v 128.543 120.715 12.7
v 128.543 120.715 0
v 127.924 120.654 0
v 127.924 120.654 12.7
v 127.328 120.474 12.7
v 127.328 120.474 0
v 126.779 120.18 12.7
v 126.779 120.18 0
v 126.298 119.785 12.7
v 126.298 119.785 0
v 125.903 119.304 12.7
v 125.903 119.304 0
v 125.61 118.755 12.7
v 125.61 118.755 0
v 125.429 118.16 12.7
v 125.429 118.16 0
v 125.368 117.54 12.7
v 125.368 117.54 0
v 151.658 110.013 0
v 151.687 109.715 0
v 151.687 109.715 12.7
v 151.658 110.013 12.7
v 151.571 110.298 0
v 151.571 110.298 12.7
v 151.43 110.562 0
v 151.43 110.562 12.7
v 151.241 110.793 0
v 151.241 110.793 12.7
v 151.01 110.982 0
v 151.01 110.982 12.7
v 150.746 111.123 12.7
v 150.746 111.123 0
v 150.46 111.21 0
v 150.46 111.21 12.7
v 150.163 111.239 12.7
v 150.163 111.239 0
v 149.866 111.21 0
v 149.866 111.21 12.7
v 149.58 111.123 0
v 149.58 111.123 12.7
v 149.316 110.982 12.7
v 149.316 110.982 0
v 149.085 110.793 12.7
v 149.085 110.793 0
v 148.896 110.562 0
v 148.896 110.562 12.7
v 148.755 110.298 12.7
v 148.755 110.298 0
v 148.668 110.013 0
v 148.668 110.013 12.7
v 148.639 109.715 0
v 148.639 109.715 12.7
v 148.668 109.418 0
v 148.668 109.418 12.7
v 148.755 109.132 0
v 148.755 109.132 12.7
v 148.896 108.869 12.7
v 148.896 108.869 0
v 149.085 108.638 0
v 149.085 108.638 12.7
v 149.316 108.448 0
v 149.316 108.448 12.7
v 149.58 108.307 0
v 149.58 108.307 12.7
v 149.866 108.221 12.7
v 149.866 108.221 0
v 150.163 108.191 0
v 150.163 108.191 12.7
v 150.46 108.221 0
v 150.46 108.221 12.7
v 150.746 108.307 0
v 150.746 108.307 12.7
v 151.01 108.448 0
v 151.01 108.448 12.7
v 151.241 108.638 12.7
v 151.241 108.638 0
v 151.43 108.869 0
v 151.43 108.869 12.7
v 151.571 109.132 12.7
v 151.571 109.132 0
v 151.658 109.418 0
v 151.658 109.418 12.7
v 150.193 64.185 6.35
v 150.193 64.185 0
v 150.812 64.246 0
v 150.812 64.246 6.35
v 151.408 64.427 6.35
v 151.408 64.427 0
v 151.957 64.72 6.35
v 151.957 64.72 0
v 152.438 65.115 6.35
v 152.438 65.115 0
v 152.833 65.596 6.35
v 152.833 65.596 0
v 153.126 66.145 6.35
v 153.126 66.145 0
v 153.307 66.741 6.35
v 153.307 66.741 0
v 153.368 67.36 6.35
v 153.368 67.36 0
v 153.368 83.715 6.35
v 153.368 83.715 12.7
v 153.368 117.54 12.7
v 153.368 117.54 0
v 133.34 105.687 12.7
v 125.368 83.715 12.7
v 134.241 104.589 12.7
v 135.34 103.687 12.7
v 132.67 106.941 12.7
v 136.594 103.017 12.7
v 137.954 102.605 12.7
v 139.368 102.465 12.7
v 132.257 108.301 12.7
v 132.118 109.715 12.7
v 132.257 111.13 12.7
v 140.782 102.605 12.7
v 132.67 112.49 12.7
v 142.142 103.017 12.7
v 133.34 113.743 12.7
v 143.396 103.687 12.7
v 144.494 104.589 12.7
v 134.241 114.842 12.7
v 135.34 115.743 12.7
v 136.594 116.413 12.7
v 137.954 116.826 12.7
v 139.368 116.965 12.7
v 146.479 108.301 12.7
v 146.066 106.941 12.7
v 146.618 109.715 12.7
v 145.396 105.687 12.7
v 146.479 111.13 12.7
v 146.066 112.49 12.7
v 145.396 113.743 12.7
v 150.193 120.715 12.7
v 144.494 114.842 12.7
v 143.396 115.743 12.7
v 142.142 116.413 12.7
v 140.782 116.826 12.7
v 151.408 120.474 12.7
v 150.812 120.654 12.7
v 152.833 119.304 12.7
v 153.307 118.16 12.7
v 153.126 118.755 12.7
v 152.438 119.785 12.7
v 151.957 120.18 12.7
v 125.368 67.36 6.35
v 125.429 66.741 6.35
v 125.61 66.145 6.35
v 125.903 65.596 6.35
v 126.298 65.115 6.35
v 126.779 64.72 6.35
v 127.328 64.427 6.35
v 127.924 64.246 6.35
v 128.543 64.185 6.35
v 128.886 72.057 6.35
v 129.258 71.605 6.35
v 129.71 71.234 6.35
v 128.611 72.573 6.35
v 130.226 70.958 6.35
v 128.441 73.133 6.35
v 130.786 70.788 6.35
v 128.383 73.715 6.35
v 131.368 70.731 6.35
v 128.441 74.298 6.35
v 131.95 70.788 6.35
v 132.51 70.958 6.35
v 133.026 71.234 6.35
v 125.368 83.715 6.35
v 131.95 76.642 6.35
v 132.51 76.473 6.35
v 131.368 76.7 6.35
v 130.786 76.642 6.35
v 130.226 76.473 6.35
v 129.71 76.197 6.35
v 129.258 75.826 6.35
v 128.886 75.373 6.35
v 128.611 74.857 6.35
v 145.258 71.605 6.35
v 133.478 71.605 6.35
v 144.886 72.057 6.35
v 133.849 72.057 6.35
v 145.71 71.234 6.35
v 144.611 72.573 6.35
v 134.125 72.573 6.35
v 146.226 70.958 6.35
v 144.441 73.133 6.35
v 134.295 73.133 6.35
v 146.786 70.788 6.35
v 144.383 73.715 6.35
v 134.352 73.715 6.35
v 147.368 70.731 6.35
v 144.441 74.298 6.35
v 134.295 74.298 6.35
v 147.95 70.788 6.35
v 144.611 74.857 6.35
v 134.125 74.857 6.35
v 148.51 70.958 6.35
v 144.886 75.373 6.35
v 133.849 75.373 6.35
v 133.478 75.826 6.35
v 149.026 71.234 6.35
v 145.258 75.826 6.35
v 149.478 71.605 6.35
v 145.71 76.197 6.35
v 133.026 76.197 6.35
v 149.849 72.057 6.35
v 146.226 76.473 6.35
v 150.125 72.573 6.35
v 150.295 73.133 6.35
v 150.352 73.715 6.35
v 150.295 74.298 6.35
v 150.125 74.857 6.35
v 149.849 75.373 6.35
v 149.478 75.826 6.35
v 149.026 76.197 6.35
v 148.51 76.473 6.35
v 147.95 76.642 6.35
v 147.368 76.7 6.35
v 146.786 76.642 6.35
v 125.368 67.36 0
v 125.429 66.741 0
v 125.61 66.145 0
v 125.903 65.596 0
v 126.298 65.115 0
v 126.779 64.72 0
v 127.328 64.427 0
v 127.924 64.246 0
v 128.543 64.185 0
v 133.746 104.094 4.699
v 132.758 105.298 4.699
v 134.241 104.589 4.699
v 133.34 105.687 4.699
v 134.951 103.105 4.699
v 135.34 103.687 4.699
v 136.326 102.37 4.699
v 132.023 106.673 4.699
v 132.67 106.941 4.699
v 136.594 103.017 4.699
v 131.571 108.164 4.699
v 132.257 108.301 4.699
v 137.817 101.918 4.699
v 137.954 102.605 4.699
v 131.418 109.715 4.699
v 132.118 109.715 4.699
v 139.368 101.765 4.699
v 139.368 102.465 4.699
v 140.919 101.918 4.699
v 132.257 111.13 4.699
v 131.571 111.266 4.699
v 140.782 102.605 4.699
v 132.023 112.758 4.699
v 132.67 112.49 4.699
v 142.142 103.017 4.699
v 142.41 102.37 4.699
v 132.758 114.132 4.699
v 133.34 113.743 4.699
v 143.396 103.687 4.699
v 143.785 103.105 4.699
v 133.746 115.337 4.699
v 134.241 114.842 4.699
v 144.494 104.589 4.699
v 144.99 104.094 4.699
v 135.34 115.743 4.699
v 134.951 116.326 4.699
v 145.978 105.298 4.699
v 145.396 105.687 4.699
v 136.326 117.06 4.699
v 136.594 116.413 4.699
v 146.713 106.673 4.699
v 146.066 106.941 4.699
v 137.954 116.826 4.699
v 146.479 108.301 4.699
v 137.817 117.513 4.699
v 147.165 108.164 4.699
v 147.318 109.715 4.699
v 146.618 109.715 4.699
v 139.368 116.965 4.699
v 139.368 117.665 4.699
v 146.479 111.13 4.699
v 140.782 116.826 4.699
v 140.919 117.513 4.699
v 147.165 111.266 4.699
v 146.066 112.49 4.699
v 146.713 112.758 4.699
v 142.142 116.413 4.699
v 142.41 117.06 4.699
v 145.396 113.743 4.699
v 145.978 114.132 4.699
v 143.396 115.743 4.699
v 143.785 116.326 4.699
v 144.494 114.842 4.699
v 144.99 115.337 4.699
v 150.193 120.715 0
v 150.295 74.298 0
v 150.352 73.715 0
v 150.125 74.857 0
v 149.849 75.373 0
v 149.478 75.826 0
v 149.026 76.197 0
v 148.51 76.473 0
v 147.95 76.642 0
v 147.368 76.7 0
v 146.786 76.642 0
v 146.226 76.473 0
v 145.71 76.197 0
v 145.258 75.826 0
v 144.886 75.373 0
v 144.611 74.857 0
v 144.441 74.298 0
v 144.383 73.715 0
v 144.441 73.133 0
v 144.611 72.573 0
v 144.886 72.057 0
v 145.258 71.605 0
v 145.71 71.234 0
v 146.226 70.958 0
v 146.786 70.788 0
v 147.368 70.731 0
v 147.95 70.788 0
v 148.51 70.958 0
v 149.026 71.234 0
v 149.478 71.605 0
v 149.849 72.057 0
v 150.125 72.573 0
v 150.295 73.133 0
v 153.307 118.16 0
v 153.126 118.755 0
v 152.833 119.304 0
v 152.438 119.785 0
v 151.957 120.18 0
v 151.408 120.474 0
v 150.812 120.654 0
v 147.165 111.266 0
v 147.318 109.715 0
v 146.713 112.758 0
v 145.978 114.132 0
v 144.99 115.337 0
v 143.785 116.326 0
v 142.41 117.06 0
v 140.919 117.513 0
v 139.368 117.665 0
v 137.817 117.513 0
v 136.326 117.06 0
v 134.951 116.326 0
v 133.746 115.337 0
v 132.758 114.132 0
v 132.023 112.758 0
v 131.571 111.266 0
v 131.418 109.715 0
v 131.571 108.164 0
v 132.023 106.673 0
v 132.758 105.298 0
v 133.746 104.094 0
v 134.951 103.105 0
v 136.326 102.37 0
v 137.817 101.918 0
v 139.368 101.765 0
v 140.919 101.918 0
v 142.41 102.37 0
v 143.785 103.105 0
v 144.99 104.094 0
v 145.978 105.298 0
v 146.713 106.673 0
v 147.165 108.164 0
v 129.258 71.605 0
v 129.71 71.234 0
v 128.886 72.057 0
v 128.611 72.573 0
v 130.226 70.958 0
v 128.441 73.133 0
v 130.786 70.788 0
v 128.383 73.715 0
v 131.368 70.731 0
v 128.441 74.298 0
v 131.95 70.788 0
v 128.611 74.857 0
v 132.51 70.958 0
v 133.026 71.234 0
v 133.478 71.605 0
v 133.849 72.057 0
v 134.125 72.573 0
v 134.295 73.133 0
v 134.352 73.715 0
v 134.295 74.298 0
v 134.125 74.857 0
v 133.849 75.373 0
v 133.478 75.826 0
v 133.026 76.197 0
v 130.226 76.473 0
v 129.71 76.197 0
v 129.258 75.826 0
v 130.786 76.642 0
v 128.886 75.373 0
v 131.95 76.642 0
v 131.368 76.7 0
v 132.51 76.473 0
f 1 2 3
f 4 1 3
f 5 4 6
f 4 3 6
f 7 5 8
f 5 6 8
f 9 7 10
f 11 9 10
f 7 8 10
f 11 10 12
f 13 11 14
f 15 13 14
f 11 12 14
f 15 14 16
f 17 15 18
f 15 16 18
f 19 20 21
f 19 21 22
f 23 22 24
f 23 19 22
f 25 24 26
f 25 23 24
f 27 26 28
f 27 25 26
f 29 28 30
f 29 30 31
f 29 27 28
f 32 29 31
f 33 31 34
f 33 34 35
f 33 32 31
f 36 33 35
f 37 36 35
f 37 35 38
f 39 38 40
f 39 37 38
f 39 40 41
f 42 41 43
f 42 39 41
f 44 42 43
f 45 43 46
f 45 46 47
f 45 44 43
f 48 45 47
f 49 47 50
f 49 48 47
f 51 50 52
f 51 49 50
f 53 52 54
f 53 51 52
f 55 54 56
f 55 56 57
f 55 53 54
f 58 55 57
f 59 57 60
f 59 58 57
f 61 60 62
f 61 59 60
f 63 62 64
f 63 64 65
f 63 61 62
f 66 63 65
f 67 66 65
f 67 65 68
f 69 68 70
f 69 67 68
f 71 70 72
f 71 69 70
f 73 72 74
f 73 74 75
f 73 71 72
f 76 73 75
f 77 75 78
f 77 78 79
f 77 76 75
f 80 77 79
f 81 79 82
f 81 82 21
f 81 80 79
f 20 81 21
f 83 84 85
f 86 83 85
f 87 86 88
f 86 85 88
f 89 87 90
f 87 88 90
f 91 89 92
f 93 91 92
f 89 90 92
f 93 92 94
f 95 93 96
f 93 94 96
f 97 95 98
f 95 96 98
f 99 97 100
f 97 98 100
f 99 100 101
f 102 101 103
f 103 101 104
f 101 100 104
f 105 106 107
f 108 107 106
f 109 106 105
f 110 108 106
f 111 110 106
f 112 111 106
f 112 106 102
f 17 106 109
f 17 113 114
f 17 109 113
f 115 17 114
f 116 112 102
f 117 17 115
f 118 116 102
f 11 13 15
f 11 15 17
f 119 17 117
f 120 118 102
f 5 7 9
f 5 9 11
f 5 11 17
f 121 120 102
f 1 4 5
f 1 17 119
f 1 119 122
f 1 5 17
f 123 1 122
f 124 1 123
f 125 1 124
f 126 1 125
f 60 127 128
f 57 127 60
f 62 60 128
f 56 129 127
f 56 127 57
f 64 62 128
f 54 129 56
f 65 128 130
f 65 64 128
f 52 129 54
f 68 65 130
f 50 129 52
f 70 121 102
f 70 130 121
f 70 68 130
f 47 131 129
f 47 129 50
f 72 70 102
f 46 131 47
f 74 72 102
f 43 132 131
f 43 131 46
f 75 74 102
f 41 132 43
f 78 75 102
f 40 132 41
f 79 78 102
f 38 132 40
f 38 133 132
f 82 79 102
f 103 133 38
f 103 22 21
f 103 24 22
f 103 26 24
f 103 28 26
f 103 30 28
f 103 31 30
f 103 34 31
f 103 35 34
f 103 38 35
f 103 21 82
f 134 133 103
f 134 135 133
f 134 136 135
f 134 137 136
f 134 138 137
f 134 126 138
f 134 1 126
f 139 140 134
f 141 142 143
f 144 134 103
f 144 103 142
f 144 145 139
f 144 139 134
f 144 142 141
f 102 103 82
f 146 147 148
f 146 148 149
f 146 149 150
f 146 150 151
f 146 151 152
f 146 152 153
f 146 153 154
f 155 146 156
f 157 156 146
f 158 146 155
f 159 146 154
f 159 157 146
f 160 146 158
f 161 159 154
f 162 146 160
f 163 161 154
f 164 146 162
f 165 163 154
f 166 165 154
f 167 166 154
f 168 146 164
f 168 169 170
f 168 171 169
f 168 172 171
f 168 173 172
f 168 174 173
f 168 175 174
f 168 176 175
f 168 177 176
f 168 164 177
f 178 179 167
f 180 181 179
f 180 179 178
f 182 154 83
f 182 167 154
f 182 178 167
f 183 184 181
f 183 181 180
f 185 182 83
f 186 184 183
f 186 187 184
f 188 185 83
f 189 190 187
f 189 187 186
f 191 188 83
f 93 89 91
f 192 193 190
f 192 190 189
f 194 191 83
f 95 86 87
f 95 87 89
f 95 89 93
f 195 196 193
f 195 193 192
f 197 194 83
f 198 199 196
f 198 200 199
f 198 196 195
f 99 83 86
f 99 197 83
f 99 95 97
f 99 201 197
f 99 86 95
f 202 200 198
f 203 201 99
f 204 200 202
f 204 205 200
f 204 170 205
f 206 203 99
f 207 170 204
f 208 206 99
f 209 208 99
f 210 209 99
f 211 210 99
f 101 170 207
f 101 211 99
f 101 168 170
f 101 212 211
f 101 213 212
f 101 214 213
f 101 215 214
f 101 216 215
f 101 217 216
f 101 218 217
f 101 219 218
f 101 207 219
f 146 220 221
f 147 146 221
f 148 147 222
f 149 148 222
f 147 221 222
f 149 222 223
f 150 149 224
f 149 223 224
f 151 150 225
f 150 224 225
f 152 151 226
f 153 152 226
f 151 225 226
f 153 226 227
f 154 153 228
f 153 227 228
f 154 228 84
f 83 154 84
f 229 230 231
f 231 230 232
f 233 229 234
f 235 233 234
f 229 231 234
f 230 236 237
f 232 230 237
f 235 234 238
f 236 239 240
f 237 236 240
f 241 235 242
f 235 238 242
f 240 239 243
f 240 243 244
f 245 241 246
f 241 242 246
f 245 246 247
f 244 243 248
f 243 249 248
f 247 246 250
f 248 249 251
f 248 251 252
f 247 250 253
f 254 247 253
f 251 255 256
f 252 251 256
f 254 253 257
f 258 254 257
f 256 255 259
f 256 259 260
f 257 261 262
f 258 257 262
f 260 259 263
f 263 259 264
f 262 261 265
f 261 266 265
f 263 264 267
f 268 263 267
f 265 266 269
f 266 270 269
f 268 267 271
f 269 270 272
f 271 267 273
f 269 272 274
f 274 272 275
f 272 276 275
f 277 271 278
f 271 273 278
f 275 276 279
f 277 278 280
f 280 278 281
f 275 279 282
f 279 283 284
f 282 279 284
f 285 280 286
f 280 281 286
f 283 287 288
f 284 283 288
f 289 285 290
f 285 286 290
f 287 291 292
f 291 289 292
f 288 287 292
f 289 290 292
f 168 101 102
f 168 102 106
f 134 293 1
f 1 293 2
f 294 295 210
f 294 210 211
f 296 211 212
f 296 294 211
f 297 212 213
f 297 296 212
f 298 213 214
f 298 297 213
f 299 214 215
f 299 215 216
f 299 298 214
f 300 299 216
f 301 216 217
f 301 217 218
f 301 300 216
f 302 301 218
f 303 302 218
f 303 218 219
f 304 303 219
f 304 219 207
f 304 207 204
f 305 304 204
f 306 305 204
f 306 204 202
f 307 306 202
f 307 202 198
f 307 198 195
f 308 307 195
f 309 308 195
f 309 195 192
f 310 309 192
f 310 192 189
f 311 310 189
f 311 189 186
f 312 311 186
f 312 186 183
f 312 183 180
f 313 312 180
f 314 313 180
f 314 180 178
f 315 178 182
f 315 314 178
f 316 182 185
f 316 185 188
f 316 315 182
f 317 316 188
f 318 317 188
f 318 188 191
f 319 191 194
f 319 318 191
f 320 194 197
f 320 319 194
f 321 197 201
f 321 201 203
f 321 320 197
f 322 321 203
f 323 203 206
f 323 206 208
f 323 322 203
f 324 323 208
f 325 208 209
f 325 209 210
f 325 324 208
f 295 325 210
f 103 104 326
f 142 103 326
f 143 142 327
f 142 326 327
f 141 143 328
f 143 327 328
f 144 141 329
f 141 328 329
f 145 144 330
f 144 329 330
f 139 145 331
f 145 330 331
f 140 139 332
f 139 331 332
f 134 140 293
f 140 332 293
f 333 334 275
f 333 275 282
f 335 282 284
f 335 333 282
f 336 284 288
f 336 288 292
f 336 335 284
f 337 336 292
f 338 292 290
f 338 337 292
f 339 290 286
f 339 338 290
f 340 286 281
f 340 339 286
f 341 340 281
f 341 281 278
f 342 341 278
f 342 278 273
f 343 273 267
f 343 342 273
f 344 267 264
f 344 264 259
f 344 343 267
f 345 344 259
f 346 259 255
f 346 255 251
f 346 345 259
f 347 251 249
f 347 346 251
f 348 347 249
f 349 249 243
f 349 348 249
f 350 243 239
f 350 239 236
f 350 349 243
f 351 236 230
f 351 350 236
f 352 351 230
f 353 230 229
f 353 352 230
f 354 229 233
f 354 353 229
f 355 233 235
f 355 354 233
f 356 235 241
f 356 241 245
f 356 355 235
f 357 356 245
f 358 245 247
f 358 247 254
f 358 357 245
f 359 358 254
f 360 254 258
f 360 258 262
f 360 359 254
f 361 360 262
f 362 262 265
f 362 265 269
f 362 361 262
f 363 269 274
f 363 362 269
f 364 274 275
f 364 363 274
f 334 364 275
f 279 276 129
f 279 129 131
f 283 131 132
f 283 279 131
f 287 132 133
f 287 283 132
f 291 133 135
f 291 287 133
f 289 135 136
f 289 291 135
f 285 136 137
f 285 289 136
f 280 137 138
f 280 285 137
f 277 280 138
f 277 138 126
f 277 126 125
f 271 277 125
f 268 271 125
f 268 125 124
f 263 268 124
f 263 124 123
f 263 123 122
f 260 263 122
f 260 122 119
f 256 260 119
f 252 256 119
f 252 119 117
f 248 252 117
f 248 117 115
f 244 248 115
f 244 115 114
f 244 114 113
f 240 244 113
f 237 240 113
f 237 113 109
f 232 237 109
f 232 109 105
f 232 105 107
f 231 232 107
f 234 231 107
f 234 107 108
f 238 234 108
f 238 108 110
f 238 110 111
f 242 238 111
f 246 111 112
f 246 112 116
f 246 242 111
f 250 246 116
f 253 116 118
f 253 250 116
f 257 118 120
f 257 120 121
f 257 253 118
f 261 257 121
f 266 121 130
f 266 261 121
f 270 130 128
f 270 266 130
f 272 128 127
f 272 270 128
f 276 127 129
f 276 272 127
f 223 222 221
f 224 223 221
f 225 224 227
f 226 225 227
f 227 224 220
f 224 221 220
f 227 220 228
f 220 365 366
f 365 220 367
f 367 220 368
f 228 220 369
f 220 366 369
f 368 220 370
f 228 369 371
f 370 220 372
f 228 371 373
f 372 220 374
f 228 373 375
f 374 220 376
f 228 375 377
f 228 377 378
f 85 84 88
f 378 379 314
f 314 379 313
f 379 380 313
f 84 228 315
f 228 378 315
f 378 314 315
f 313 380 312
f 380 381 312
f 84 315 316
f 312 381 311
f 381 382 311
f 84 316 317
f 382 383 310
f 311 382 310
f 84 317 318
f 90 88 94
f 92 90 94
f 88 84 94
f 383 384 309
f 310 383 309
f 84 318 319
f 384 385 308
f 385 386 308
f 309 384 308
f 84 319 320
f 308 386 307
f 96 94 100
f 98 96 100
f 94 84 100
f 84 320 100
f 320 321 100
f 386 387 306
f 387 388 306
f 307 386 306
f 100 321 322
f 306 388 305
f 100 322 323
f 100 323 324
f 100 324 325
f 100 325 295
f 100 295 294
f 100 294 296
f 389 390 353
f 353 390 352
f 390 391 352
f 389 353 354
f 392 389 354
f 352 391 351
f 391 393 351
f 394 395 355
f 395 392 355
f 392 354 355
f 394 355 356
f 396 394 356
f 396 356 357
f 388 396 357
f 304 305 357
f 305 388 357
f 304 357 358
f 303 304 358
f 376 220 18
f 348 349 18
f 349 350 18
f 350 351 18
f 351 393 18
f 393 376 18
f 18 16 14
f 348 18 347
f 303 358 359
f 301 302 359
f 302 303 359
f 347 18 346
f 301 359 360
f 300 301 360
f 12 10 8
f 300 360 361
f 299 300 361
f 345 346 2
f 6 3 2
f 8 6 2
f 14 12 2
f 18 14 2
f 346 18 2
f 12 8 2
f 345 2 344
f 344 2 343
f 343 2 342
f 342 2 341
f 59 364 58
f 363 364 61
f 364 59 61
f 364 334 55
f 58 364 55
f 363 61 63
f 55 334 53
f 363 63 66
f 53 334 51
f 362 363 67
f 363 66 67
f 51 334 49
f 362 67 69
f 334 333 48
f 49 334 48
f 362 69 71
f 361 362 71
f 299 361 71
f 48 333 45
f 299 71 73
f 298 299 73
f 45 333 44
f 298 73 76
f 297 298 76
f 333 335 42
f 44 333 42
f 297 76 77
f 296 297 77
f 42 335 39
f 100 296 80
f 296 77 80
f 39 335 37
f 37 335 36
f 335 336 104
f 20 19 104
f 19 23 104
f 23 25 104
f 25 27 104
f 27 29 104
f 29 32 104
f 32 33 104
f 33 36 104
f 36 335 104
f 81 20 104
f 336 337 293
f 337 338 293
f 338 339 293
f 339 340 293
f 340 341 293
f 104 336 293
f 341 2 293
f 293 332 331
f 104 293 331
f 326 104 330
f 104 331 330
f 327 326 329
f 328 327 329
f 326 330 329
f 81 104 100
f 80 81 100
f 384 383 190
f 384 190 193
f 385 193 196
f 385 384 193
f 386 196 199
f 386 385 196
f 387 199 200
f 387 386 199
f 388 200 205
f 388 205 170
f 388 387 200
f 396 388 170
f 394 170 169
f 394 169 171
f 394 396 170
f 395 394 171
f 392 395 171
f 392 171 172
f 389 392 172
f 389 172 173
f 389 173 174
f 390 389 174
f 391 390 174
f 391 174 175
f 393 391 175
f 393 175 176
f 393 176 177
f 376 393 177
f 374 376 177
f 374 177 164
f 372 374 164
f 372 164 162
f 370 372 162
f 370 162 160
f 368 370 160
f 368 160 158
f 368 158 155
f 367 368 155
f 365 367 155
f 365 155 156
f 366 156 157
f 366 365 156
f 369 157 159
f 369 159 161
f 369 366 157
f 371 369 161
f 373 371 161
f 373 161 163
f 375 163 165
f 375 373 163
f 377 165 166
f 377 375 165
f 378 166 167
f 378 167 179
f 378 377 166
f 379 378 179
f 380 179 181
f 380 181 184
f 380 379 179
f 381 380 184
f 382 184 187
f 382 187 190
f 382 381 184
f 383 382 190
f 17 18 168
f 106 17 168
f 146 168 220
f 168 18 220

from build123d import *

# Parameters (mm, degrees)
SKETCH1_R           = 7.9502
SKETCH1_R_2         = 1.524
SKETCH1_R_3         = 2.9845
SKETCH1_R_4         = 7.250000001
BOSS_EXTRUDE1_DEPTH = 12.7
SKETCH1_3_R         = 7.9502
SKETCH1_3_R_2       = 7.250000001
CUT_EXTRUDE1_DEPTH  = 4.699
CUT_EXTRUDE2_START  = 6.35
SKETCH1_4_R         = 2.9845
CUT_EXTRUDE2_DEPTH  = 6.35


with BuildPart() as part:
    # Sketch1 → Boss-Extrude1 (new body)
    # profile 1 of 3: a face of its own
    with BuildSketch(Plane.XY):
        with BuildLine():
            Line((125.367960427, 117.540284058), (125.367960427, 83.715284058))
            Line((125.367960427, 83.715284058), (153.367960426, 83.715284058))
            Line((153.367960426, 83.715284058), (153.367960426, 117.540284058))
            ThreePointArc((153.367960426, 117.540284058), (152.438024457, 119.785348088), (150.192960426, 120.715284058))
            Line((150.192960426, 120.715284058), (128.542960427, 120.715284058))
            ThreePointArc((128.542960427, 120.715284058), (126.297896397, 119.785348088), (125.367960427, 117.540284058))
        make_face()
        with Locations((139.367960428, 109.715284059)):
            Circle(SKETCH1_R, mode=Mode.SUBTRACT)
        with Locations((150.162960428, 109.715284059)):
            Circle(SKETCH1_R_2, mode=Mode.SUBTRACT)
    # profile 2 of 3: a face of its own
    with BuildSketch(Plane.XY):
        with BuildLine():
            ThreePointArc((125.367960427, 67.360204058), (126.297896397, 65.115140027), (128.542960427, 64.185204058))
            Line((128.542960427, 64.185204058), (150.192960426, 64.185204058))
            ThreePointArc((150.192960426, 64.185204058), (152.438024457, 65.115140027), (153.367960426, 67.360204058))
            Line((153.367960426, 67.360204058), (153.367960426, 83.715284058))
            Line((153.367960426, 83.715284058), (125.367960427, 83.715284058))
            Line((125.367960427, 83.715284058), (125.367960427, 67.360204058))
        make_face()
        with Locations((131.367960426, 73.715284058)):
            Circle(SKETCH1_R_3, mode=Mode.SUBTRACT)
        with Locations((147.367960427, 73.715284058)):
            Circle(SKETCH1_R_3, mode=Mode.SUBTRACT)
    # profile 3 of 3: a face of its own
    with BuildSketch(Plane.XY):
        with Locations((139.367960428, 109.715284059)):
            Circle(SKETCH1_R)
        with Locations((139.367960428, 109.715284059)):
            Circle(SKETCH1_R_4, mode=Mode.SUBTRACT)
    extrude(amount=BOSS_EXTRUDE1_DEPTH)

    # Sketch1<3> → Cut-Extrude1 (cut)
    with BuildSketch(Plane.XY):
        with Locations((139.367960428, 109.715284059)):
            Circle(SKETCH1_3_R)
        with Locations((139.367960428, 109.715284059)):
            Circle(SKETCH1_3_R_2, mode=Mode.SUBTRACT)
    extrude(amount=CUT_EXTRUDE1_DEPTH, mode=Mode.SUBTRACT)

    # Sketch1<4> → Cut-Extrude2 (cut)
    with BuildSketch(Plane.XY.offset(CUT_EXTRUDE2_START)):
        with BuildLine():
            ThreePointArc((125.367960427, 67.360204058), (126.297896397, 65.115140027), (128.542960427, 64.185204058))
            Line((128.542960427, 64.185204058), (150.192960426, 64.185204058))
            ThreePointArc((150.192960426, 64.185204058), (152.438024457, 65.115140027), (153.367960426, 67.360204058))
            Line((153.367960426, 67.360204058), (153.367960426, 83.715284058))
            Line((153.367960426, 83.715284058), (125.367960427, 83.715284058))
            Line((125.367960427, 83.715284058), (125.367960427, 67.360204058))
        make_face()
        with Locations((131.367960426, 73.715284058)):
            Circle(SKETCH1_4_R, mode=Mode.SUBTRACT)
        with Locations((147.367960427, 73.715284058)):
            Circle(SKETCH1_4_R, mode=Mode.SUBTRACT)
    extrude(amount=CUT_EXTRUDE2_DEPTH, mode=Mode.SUBTRACT)


solid = part.part
